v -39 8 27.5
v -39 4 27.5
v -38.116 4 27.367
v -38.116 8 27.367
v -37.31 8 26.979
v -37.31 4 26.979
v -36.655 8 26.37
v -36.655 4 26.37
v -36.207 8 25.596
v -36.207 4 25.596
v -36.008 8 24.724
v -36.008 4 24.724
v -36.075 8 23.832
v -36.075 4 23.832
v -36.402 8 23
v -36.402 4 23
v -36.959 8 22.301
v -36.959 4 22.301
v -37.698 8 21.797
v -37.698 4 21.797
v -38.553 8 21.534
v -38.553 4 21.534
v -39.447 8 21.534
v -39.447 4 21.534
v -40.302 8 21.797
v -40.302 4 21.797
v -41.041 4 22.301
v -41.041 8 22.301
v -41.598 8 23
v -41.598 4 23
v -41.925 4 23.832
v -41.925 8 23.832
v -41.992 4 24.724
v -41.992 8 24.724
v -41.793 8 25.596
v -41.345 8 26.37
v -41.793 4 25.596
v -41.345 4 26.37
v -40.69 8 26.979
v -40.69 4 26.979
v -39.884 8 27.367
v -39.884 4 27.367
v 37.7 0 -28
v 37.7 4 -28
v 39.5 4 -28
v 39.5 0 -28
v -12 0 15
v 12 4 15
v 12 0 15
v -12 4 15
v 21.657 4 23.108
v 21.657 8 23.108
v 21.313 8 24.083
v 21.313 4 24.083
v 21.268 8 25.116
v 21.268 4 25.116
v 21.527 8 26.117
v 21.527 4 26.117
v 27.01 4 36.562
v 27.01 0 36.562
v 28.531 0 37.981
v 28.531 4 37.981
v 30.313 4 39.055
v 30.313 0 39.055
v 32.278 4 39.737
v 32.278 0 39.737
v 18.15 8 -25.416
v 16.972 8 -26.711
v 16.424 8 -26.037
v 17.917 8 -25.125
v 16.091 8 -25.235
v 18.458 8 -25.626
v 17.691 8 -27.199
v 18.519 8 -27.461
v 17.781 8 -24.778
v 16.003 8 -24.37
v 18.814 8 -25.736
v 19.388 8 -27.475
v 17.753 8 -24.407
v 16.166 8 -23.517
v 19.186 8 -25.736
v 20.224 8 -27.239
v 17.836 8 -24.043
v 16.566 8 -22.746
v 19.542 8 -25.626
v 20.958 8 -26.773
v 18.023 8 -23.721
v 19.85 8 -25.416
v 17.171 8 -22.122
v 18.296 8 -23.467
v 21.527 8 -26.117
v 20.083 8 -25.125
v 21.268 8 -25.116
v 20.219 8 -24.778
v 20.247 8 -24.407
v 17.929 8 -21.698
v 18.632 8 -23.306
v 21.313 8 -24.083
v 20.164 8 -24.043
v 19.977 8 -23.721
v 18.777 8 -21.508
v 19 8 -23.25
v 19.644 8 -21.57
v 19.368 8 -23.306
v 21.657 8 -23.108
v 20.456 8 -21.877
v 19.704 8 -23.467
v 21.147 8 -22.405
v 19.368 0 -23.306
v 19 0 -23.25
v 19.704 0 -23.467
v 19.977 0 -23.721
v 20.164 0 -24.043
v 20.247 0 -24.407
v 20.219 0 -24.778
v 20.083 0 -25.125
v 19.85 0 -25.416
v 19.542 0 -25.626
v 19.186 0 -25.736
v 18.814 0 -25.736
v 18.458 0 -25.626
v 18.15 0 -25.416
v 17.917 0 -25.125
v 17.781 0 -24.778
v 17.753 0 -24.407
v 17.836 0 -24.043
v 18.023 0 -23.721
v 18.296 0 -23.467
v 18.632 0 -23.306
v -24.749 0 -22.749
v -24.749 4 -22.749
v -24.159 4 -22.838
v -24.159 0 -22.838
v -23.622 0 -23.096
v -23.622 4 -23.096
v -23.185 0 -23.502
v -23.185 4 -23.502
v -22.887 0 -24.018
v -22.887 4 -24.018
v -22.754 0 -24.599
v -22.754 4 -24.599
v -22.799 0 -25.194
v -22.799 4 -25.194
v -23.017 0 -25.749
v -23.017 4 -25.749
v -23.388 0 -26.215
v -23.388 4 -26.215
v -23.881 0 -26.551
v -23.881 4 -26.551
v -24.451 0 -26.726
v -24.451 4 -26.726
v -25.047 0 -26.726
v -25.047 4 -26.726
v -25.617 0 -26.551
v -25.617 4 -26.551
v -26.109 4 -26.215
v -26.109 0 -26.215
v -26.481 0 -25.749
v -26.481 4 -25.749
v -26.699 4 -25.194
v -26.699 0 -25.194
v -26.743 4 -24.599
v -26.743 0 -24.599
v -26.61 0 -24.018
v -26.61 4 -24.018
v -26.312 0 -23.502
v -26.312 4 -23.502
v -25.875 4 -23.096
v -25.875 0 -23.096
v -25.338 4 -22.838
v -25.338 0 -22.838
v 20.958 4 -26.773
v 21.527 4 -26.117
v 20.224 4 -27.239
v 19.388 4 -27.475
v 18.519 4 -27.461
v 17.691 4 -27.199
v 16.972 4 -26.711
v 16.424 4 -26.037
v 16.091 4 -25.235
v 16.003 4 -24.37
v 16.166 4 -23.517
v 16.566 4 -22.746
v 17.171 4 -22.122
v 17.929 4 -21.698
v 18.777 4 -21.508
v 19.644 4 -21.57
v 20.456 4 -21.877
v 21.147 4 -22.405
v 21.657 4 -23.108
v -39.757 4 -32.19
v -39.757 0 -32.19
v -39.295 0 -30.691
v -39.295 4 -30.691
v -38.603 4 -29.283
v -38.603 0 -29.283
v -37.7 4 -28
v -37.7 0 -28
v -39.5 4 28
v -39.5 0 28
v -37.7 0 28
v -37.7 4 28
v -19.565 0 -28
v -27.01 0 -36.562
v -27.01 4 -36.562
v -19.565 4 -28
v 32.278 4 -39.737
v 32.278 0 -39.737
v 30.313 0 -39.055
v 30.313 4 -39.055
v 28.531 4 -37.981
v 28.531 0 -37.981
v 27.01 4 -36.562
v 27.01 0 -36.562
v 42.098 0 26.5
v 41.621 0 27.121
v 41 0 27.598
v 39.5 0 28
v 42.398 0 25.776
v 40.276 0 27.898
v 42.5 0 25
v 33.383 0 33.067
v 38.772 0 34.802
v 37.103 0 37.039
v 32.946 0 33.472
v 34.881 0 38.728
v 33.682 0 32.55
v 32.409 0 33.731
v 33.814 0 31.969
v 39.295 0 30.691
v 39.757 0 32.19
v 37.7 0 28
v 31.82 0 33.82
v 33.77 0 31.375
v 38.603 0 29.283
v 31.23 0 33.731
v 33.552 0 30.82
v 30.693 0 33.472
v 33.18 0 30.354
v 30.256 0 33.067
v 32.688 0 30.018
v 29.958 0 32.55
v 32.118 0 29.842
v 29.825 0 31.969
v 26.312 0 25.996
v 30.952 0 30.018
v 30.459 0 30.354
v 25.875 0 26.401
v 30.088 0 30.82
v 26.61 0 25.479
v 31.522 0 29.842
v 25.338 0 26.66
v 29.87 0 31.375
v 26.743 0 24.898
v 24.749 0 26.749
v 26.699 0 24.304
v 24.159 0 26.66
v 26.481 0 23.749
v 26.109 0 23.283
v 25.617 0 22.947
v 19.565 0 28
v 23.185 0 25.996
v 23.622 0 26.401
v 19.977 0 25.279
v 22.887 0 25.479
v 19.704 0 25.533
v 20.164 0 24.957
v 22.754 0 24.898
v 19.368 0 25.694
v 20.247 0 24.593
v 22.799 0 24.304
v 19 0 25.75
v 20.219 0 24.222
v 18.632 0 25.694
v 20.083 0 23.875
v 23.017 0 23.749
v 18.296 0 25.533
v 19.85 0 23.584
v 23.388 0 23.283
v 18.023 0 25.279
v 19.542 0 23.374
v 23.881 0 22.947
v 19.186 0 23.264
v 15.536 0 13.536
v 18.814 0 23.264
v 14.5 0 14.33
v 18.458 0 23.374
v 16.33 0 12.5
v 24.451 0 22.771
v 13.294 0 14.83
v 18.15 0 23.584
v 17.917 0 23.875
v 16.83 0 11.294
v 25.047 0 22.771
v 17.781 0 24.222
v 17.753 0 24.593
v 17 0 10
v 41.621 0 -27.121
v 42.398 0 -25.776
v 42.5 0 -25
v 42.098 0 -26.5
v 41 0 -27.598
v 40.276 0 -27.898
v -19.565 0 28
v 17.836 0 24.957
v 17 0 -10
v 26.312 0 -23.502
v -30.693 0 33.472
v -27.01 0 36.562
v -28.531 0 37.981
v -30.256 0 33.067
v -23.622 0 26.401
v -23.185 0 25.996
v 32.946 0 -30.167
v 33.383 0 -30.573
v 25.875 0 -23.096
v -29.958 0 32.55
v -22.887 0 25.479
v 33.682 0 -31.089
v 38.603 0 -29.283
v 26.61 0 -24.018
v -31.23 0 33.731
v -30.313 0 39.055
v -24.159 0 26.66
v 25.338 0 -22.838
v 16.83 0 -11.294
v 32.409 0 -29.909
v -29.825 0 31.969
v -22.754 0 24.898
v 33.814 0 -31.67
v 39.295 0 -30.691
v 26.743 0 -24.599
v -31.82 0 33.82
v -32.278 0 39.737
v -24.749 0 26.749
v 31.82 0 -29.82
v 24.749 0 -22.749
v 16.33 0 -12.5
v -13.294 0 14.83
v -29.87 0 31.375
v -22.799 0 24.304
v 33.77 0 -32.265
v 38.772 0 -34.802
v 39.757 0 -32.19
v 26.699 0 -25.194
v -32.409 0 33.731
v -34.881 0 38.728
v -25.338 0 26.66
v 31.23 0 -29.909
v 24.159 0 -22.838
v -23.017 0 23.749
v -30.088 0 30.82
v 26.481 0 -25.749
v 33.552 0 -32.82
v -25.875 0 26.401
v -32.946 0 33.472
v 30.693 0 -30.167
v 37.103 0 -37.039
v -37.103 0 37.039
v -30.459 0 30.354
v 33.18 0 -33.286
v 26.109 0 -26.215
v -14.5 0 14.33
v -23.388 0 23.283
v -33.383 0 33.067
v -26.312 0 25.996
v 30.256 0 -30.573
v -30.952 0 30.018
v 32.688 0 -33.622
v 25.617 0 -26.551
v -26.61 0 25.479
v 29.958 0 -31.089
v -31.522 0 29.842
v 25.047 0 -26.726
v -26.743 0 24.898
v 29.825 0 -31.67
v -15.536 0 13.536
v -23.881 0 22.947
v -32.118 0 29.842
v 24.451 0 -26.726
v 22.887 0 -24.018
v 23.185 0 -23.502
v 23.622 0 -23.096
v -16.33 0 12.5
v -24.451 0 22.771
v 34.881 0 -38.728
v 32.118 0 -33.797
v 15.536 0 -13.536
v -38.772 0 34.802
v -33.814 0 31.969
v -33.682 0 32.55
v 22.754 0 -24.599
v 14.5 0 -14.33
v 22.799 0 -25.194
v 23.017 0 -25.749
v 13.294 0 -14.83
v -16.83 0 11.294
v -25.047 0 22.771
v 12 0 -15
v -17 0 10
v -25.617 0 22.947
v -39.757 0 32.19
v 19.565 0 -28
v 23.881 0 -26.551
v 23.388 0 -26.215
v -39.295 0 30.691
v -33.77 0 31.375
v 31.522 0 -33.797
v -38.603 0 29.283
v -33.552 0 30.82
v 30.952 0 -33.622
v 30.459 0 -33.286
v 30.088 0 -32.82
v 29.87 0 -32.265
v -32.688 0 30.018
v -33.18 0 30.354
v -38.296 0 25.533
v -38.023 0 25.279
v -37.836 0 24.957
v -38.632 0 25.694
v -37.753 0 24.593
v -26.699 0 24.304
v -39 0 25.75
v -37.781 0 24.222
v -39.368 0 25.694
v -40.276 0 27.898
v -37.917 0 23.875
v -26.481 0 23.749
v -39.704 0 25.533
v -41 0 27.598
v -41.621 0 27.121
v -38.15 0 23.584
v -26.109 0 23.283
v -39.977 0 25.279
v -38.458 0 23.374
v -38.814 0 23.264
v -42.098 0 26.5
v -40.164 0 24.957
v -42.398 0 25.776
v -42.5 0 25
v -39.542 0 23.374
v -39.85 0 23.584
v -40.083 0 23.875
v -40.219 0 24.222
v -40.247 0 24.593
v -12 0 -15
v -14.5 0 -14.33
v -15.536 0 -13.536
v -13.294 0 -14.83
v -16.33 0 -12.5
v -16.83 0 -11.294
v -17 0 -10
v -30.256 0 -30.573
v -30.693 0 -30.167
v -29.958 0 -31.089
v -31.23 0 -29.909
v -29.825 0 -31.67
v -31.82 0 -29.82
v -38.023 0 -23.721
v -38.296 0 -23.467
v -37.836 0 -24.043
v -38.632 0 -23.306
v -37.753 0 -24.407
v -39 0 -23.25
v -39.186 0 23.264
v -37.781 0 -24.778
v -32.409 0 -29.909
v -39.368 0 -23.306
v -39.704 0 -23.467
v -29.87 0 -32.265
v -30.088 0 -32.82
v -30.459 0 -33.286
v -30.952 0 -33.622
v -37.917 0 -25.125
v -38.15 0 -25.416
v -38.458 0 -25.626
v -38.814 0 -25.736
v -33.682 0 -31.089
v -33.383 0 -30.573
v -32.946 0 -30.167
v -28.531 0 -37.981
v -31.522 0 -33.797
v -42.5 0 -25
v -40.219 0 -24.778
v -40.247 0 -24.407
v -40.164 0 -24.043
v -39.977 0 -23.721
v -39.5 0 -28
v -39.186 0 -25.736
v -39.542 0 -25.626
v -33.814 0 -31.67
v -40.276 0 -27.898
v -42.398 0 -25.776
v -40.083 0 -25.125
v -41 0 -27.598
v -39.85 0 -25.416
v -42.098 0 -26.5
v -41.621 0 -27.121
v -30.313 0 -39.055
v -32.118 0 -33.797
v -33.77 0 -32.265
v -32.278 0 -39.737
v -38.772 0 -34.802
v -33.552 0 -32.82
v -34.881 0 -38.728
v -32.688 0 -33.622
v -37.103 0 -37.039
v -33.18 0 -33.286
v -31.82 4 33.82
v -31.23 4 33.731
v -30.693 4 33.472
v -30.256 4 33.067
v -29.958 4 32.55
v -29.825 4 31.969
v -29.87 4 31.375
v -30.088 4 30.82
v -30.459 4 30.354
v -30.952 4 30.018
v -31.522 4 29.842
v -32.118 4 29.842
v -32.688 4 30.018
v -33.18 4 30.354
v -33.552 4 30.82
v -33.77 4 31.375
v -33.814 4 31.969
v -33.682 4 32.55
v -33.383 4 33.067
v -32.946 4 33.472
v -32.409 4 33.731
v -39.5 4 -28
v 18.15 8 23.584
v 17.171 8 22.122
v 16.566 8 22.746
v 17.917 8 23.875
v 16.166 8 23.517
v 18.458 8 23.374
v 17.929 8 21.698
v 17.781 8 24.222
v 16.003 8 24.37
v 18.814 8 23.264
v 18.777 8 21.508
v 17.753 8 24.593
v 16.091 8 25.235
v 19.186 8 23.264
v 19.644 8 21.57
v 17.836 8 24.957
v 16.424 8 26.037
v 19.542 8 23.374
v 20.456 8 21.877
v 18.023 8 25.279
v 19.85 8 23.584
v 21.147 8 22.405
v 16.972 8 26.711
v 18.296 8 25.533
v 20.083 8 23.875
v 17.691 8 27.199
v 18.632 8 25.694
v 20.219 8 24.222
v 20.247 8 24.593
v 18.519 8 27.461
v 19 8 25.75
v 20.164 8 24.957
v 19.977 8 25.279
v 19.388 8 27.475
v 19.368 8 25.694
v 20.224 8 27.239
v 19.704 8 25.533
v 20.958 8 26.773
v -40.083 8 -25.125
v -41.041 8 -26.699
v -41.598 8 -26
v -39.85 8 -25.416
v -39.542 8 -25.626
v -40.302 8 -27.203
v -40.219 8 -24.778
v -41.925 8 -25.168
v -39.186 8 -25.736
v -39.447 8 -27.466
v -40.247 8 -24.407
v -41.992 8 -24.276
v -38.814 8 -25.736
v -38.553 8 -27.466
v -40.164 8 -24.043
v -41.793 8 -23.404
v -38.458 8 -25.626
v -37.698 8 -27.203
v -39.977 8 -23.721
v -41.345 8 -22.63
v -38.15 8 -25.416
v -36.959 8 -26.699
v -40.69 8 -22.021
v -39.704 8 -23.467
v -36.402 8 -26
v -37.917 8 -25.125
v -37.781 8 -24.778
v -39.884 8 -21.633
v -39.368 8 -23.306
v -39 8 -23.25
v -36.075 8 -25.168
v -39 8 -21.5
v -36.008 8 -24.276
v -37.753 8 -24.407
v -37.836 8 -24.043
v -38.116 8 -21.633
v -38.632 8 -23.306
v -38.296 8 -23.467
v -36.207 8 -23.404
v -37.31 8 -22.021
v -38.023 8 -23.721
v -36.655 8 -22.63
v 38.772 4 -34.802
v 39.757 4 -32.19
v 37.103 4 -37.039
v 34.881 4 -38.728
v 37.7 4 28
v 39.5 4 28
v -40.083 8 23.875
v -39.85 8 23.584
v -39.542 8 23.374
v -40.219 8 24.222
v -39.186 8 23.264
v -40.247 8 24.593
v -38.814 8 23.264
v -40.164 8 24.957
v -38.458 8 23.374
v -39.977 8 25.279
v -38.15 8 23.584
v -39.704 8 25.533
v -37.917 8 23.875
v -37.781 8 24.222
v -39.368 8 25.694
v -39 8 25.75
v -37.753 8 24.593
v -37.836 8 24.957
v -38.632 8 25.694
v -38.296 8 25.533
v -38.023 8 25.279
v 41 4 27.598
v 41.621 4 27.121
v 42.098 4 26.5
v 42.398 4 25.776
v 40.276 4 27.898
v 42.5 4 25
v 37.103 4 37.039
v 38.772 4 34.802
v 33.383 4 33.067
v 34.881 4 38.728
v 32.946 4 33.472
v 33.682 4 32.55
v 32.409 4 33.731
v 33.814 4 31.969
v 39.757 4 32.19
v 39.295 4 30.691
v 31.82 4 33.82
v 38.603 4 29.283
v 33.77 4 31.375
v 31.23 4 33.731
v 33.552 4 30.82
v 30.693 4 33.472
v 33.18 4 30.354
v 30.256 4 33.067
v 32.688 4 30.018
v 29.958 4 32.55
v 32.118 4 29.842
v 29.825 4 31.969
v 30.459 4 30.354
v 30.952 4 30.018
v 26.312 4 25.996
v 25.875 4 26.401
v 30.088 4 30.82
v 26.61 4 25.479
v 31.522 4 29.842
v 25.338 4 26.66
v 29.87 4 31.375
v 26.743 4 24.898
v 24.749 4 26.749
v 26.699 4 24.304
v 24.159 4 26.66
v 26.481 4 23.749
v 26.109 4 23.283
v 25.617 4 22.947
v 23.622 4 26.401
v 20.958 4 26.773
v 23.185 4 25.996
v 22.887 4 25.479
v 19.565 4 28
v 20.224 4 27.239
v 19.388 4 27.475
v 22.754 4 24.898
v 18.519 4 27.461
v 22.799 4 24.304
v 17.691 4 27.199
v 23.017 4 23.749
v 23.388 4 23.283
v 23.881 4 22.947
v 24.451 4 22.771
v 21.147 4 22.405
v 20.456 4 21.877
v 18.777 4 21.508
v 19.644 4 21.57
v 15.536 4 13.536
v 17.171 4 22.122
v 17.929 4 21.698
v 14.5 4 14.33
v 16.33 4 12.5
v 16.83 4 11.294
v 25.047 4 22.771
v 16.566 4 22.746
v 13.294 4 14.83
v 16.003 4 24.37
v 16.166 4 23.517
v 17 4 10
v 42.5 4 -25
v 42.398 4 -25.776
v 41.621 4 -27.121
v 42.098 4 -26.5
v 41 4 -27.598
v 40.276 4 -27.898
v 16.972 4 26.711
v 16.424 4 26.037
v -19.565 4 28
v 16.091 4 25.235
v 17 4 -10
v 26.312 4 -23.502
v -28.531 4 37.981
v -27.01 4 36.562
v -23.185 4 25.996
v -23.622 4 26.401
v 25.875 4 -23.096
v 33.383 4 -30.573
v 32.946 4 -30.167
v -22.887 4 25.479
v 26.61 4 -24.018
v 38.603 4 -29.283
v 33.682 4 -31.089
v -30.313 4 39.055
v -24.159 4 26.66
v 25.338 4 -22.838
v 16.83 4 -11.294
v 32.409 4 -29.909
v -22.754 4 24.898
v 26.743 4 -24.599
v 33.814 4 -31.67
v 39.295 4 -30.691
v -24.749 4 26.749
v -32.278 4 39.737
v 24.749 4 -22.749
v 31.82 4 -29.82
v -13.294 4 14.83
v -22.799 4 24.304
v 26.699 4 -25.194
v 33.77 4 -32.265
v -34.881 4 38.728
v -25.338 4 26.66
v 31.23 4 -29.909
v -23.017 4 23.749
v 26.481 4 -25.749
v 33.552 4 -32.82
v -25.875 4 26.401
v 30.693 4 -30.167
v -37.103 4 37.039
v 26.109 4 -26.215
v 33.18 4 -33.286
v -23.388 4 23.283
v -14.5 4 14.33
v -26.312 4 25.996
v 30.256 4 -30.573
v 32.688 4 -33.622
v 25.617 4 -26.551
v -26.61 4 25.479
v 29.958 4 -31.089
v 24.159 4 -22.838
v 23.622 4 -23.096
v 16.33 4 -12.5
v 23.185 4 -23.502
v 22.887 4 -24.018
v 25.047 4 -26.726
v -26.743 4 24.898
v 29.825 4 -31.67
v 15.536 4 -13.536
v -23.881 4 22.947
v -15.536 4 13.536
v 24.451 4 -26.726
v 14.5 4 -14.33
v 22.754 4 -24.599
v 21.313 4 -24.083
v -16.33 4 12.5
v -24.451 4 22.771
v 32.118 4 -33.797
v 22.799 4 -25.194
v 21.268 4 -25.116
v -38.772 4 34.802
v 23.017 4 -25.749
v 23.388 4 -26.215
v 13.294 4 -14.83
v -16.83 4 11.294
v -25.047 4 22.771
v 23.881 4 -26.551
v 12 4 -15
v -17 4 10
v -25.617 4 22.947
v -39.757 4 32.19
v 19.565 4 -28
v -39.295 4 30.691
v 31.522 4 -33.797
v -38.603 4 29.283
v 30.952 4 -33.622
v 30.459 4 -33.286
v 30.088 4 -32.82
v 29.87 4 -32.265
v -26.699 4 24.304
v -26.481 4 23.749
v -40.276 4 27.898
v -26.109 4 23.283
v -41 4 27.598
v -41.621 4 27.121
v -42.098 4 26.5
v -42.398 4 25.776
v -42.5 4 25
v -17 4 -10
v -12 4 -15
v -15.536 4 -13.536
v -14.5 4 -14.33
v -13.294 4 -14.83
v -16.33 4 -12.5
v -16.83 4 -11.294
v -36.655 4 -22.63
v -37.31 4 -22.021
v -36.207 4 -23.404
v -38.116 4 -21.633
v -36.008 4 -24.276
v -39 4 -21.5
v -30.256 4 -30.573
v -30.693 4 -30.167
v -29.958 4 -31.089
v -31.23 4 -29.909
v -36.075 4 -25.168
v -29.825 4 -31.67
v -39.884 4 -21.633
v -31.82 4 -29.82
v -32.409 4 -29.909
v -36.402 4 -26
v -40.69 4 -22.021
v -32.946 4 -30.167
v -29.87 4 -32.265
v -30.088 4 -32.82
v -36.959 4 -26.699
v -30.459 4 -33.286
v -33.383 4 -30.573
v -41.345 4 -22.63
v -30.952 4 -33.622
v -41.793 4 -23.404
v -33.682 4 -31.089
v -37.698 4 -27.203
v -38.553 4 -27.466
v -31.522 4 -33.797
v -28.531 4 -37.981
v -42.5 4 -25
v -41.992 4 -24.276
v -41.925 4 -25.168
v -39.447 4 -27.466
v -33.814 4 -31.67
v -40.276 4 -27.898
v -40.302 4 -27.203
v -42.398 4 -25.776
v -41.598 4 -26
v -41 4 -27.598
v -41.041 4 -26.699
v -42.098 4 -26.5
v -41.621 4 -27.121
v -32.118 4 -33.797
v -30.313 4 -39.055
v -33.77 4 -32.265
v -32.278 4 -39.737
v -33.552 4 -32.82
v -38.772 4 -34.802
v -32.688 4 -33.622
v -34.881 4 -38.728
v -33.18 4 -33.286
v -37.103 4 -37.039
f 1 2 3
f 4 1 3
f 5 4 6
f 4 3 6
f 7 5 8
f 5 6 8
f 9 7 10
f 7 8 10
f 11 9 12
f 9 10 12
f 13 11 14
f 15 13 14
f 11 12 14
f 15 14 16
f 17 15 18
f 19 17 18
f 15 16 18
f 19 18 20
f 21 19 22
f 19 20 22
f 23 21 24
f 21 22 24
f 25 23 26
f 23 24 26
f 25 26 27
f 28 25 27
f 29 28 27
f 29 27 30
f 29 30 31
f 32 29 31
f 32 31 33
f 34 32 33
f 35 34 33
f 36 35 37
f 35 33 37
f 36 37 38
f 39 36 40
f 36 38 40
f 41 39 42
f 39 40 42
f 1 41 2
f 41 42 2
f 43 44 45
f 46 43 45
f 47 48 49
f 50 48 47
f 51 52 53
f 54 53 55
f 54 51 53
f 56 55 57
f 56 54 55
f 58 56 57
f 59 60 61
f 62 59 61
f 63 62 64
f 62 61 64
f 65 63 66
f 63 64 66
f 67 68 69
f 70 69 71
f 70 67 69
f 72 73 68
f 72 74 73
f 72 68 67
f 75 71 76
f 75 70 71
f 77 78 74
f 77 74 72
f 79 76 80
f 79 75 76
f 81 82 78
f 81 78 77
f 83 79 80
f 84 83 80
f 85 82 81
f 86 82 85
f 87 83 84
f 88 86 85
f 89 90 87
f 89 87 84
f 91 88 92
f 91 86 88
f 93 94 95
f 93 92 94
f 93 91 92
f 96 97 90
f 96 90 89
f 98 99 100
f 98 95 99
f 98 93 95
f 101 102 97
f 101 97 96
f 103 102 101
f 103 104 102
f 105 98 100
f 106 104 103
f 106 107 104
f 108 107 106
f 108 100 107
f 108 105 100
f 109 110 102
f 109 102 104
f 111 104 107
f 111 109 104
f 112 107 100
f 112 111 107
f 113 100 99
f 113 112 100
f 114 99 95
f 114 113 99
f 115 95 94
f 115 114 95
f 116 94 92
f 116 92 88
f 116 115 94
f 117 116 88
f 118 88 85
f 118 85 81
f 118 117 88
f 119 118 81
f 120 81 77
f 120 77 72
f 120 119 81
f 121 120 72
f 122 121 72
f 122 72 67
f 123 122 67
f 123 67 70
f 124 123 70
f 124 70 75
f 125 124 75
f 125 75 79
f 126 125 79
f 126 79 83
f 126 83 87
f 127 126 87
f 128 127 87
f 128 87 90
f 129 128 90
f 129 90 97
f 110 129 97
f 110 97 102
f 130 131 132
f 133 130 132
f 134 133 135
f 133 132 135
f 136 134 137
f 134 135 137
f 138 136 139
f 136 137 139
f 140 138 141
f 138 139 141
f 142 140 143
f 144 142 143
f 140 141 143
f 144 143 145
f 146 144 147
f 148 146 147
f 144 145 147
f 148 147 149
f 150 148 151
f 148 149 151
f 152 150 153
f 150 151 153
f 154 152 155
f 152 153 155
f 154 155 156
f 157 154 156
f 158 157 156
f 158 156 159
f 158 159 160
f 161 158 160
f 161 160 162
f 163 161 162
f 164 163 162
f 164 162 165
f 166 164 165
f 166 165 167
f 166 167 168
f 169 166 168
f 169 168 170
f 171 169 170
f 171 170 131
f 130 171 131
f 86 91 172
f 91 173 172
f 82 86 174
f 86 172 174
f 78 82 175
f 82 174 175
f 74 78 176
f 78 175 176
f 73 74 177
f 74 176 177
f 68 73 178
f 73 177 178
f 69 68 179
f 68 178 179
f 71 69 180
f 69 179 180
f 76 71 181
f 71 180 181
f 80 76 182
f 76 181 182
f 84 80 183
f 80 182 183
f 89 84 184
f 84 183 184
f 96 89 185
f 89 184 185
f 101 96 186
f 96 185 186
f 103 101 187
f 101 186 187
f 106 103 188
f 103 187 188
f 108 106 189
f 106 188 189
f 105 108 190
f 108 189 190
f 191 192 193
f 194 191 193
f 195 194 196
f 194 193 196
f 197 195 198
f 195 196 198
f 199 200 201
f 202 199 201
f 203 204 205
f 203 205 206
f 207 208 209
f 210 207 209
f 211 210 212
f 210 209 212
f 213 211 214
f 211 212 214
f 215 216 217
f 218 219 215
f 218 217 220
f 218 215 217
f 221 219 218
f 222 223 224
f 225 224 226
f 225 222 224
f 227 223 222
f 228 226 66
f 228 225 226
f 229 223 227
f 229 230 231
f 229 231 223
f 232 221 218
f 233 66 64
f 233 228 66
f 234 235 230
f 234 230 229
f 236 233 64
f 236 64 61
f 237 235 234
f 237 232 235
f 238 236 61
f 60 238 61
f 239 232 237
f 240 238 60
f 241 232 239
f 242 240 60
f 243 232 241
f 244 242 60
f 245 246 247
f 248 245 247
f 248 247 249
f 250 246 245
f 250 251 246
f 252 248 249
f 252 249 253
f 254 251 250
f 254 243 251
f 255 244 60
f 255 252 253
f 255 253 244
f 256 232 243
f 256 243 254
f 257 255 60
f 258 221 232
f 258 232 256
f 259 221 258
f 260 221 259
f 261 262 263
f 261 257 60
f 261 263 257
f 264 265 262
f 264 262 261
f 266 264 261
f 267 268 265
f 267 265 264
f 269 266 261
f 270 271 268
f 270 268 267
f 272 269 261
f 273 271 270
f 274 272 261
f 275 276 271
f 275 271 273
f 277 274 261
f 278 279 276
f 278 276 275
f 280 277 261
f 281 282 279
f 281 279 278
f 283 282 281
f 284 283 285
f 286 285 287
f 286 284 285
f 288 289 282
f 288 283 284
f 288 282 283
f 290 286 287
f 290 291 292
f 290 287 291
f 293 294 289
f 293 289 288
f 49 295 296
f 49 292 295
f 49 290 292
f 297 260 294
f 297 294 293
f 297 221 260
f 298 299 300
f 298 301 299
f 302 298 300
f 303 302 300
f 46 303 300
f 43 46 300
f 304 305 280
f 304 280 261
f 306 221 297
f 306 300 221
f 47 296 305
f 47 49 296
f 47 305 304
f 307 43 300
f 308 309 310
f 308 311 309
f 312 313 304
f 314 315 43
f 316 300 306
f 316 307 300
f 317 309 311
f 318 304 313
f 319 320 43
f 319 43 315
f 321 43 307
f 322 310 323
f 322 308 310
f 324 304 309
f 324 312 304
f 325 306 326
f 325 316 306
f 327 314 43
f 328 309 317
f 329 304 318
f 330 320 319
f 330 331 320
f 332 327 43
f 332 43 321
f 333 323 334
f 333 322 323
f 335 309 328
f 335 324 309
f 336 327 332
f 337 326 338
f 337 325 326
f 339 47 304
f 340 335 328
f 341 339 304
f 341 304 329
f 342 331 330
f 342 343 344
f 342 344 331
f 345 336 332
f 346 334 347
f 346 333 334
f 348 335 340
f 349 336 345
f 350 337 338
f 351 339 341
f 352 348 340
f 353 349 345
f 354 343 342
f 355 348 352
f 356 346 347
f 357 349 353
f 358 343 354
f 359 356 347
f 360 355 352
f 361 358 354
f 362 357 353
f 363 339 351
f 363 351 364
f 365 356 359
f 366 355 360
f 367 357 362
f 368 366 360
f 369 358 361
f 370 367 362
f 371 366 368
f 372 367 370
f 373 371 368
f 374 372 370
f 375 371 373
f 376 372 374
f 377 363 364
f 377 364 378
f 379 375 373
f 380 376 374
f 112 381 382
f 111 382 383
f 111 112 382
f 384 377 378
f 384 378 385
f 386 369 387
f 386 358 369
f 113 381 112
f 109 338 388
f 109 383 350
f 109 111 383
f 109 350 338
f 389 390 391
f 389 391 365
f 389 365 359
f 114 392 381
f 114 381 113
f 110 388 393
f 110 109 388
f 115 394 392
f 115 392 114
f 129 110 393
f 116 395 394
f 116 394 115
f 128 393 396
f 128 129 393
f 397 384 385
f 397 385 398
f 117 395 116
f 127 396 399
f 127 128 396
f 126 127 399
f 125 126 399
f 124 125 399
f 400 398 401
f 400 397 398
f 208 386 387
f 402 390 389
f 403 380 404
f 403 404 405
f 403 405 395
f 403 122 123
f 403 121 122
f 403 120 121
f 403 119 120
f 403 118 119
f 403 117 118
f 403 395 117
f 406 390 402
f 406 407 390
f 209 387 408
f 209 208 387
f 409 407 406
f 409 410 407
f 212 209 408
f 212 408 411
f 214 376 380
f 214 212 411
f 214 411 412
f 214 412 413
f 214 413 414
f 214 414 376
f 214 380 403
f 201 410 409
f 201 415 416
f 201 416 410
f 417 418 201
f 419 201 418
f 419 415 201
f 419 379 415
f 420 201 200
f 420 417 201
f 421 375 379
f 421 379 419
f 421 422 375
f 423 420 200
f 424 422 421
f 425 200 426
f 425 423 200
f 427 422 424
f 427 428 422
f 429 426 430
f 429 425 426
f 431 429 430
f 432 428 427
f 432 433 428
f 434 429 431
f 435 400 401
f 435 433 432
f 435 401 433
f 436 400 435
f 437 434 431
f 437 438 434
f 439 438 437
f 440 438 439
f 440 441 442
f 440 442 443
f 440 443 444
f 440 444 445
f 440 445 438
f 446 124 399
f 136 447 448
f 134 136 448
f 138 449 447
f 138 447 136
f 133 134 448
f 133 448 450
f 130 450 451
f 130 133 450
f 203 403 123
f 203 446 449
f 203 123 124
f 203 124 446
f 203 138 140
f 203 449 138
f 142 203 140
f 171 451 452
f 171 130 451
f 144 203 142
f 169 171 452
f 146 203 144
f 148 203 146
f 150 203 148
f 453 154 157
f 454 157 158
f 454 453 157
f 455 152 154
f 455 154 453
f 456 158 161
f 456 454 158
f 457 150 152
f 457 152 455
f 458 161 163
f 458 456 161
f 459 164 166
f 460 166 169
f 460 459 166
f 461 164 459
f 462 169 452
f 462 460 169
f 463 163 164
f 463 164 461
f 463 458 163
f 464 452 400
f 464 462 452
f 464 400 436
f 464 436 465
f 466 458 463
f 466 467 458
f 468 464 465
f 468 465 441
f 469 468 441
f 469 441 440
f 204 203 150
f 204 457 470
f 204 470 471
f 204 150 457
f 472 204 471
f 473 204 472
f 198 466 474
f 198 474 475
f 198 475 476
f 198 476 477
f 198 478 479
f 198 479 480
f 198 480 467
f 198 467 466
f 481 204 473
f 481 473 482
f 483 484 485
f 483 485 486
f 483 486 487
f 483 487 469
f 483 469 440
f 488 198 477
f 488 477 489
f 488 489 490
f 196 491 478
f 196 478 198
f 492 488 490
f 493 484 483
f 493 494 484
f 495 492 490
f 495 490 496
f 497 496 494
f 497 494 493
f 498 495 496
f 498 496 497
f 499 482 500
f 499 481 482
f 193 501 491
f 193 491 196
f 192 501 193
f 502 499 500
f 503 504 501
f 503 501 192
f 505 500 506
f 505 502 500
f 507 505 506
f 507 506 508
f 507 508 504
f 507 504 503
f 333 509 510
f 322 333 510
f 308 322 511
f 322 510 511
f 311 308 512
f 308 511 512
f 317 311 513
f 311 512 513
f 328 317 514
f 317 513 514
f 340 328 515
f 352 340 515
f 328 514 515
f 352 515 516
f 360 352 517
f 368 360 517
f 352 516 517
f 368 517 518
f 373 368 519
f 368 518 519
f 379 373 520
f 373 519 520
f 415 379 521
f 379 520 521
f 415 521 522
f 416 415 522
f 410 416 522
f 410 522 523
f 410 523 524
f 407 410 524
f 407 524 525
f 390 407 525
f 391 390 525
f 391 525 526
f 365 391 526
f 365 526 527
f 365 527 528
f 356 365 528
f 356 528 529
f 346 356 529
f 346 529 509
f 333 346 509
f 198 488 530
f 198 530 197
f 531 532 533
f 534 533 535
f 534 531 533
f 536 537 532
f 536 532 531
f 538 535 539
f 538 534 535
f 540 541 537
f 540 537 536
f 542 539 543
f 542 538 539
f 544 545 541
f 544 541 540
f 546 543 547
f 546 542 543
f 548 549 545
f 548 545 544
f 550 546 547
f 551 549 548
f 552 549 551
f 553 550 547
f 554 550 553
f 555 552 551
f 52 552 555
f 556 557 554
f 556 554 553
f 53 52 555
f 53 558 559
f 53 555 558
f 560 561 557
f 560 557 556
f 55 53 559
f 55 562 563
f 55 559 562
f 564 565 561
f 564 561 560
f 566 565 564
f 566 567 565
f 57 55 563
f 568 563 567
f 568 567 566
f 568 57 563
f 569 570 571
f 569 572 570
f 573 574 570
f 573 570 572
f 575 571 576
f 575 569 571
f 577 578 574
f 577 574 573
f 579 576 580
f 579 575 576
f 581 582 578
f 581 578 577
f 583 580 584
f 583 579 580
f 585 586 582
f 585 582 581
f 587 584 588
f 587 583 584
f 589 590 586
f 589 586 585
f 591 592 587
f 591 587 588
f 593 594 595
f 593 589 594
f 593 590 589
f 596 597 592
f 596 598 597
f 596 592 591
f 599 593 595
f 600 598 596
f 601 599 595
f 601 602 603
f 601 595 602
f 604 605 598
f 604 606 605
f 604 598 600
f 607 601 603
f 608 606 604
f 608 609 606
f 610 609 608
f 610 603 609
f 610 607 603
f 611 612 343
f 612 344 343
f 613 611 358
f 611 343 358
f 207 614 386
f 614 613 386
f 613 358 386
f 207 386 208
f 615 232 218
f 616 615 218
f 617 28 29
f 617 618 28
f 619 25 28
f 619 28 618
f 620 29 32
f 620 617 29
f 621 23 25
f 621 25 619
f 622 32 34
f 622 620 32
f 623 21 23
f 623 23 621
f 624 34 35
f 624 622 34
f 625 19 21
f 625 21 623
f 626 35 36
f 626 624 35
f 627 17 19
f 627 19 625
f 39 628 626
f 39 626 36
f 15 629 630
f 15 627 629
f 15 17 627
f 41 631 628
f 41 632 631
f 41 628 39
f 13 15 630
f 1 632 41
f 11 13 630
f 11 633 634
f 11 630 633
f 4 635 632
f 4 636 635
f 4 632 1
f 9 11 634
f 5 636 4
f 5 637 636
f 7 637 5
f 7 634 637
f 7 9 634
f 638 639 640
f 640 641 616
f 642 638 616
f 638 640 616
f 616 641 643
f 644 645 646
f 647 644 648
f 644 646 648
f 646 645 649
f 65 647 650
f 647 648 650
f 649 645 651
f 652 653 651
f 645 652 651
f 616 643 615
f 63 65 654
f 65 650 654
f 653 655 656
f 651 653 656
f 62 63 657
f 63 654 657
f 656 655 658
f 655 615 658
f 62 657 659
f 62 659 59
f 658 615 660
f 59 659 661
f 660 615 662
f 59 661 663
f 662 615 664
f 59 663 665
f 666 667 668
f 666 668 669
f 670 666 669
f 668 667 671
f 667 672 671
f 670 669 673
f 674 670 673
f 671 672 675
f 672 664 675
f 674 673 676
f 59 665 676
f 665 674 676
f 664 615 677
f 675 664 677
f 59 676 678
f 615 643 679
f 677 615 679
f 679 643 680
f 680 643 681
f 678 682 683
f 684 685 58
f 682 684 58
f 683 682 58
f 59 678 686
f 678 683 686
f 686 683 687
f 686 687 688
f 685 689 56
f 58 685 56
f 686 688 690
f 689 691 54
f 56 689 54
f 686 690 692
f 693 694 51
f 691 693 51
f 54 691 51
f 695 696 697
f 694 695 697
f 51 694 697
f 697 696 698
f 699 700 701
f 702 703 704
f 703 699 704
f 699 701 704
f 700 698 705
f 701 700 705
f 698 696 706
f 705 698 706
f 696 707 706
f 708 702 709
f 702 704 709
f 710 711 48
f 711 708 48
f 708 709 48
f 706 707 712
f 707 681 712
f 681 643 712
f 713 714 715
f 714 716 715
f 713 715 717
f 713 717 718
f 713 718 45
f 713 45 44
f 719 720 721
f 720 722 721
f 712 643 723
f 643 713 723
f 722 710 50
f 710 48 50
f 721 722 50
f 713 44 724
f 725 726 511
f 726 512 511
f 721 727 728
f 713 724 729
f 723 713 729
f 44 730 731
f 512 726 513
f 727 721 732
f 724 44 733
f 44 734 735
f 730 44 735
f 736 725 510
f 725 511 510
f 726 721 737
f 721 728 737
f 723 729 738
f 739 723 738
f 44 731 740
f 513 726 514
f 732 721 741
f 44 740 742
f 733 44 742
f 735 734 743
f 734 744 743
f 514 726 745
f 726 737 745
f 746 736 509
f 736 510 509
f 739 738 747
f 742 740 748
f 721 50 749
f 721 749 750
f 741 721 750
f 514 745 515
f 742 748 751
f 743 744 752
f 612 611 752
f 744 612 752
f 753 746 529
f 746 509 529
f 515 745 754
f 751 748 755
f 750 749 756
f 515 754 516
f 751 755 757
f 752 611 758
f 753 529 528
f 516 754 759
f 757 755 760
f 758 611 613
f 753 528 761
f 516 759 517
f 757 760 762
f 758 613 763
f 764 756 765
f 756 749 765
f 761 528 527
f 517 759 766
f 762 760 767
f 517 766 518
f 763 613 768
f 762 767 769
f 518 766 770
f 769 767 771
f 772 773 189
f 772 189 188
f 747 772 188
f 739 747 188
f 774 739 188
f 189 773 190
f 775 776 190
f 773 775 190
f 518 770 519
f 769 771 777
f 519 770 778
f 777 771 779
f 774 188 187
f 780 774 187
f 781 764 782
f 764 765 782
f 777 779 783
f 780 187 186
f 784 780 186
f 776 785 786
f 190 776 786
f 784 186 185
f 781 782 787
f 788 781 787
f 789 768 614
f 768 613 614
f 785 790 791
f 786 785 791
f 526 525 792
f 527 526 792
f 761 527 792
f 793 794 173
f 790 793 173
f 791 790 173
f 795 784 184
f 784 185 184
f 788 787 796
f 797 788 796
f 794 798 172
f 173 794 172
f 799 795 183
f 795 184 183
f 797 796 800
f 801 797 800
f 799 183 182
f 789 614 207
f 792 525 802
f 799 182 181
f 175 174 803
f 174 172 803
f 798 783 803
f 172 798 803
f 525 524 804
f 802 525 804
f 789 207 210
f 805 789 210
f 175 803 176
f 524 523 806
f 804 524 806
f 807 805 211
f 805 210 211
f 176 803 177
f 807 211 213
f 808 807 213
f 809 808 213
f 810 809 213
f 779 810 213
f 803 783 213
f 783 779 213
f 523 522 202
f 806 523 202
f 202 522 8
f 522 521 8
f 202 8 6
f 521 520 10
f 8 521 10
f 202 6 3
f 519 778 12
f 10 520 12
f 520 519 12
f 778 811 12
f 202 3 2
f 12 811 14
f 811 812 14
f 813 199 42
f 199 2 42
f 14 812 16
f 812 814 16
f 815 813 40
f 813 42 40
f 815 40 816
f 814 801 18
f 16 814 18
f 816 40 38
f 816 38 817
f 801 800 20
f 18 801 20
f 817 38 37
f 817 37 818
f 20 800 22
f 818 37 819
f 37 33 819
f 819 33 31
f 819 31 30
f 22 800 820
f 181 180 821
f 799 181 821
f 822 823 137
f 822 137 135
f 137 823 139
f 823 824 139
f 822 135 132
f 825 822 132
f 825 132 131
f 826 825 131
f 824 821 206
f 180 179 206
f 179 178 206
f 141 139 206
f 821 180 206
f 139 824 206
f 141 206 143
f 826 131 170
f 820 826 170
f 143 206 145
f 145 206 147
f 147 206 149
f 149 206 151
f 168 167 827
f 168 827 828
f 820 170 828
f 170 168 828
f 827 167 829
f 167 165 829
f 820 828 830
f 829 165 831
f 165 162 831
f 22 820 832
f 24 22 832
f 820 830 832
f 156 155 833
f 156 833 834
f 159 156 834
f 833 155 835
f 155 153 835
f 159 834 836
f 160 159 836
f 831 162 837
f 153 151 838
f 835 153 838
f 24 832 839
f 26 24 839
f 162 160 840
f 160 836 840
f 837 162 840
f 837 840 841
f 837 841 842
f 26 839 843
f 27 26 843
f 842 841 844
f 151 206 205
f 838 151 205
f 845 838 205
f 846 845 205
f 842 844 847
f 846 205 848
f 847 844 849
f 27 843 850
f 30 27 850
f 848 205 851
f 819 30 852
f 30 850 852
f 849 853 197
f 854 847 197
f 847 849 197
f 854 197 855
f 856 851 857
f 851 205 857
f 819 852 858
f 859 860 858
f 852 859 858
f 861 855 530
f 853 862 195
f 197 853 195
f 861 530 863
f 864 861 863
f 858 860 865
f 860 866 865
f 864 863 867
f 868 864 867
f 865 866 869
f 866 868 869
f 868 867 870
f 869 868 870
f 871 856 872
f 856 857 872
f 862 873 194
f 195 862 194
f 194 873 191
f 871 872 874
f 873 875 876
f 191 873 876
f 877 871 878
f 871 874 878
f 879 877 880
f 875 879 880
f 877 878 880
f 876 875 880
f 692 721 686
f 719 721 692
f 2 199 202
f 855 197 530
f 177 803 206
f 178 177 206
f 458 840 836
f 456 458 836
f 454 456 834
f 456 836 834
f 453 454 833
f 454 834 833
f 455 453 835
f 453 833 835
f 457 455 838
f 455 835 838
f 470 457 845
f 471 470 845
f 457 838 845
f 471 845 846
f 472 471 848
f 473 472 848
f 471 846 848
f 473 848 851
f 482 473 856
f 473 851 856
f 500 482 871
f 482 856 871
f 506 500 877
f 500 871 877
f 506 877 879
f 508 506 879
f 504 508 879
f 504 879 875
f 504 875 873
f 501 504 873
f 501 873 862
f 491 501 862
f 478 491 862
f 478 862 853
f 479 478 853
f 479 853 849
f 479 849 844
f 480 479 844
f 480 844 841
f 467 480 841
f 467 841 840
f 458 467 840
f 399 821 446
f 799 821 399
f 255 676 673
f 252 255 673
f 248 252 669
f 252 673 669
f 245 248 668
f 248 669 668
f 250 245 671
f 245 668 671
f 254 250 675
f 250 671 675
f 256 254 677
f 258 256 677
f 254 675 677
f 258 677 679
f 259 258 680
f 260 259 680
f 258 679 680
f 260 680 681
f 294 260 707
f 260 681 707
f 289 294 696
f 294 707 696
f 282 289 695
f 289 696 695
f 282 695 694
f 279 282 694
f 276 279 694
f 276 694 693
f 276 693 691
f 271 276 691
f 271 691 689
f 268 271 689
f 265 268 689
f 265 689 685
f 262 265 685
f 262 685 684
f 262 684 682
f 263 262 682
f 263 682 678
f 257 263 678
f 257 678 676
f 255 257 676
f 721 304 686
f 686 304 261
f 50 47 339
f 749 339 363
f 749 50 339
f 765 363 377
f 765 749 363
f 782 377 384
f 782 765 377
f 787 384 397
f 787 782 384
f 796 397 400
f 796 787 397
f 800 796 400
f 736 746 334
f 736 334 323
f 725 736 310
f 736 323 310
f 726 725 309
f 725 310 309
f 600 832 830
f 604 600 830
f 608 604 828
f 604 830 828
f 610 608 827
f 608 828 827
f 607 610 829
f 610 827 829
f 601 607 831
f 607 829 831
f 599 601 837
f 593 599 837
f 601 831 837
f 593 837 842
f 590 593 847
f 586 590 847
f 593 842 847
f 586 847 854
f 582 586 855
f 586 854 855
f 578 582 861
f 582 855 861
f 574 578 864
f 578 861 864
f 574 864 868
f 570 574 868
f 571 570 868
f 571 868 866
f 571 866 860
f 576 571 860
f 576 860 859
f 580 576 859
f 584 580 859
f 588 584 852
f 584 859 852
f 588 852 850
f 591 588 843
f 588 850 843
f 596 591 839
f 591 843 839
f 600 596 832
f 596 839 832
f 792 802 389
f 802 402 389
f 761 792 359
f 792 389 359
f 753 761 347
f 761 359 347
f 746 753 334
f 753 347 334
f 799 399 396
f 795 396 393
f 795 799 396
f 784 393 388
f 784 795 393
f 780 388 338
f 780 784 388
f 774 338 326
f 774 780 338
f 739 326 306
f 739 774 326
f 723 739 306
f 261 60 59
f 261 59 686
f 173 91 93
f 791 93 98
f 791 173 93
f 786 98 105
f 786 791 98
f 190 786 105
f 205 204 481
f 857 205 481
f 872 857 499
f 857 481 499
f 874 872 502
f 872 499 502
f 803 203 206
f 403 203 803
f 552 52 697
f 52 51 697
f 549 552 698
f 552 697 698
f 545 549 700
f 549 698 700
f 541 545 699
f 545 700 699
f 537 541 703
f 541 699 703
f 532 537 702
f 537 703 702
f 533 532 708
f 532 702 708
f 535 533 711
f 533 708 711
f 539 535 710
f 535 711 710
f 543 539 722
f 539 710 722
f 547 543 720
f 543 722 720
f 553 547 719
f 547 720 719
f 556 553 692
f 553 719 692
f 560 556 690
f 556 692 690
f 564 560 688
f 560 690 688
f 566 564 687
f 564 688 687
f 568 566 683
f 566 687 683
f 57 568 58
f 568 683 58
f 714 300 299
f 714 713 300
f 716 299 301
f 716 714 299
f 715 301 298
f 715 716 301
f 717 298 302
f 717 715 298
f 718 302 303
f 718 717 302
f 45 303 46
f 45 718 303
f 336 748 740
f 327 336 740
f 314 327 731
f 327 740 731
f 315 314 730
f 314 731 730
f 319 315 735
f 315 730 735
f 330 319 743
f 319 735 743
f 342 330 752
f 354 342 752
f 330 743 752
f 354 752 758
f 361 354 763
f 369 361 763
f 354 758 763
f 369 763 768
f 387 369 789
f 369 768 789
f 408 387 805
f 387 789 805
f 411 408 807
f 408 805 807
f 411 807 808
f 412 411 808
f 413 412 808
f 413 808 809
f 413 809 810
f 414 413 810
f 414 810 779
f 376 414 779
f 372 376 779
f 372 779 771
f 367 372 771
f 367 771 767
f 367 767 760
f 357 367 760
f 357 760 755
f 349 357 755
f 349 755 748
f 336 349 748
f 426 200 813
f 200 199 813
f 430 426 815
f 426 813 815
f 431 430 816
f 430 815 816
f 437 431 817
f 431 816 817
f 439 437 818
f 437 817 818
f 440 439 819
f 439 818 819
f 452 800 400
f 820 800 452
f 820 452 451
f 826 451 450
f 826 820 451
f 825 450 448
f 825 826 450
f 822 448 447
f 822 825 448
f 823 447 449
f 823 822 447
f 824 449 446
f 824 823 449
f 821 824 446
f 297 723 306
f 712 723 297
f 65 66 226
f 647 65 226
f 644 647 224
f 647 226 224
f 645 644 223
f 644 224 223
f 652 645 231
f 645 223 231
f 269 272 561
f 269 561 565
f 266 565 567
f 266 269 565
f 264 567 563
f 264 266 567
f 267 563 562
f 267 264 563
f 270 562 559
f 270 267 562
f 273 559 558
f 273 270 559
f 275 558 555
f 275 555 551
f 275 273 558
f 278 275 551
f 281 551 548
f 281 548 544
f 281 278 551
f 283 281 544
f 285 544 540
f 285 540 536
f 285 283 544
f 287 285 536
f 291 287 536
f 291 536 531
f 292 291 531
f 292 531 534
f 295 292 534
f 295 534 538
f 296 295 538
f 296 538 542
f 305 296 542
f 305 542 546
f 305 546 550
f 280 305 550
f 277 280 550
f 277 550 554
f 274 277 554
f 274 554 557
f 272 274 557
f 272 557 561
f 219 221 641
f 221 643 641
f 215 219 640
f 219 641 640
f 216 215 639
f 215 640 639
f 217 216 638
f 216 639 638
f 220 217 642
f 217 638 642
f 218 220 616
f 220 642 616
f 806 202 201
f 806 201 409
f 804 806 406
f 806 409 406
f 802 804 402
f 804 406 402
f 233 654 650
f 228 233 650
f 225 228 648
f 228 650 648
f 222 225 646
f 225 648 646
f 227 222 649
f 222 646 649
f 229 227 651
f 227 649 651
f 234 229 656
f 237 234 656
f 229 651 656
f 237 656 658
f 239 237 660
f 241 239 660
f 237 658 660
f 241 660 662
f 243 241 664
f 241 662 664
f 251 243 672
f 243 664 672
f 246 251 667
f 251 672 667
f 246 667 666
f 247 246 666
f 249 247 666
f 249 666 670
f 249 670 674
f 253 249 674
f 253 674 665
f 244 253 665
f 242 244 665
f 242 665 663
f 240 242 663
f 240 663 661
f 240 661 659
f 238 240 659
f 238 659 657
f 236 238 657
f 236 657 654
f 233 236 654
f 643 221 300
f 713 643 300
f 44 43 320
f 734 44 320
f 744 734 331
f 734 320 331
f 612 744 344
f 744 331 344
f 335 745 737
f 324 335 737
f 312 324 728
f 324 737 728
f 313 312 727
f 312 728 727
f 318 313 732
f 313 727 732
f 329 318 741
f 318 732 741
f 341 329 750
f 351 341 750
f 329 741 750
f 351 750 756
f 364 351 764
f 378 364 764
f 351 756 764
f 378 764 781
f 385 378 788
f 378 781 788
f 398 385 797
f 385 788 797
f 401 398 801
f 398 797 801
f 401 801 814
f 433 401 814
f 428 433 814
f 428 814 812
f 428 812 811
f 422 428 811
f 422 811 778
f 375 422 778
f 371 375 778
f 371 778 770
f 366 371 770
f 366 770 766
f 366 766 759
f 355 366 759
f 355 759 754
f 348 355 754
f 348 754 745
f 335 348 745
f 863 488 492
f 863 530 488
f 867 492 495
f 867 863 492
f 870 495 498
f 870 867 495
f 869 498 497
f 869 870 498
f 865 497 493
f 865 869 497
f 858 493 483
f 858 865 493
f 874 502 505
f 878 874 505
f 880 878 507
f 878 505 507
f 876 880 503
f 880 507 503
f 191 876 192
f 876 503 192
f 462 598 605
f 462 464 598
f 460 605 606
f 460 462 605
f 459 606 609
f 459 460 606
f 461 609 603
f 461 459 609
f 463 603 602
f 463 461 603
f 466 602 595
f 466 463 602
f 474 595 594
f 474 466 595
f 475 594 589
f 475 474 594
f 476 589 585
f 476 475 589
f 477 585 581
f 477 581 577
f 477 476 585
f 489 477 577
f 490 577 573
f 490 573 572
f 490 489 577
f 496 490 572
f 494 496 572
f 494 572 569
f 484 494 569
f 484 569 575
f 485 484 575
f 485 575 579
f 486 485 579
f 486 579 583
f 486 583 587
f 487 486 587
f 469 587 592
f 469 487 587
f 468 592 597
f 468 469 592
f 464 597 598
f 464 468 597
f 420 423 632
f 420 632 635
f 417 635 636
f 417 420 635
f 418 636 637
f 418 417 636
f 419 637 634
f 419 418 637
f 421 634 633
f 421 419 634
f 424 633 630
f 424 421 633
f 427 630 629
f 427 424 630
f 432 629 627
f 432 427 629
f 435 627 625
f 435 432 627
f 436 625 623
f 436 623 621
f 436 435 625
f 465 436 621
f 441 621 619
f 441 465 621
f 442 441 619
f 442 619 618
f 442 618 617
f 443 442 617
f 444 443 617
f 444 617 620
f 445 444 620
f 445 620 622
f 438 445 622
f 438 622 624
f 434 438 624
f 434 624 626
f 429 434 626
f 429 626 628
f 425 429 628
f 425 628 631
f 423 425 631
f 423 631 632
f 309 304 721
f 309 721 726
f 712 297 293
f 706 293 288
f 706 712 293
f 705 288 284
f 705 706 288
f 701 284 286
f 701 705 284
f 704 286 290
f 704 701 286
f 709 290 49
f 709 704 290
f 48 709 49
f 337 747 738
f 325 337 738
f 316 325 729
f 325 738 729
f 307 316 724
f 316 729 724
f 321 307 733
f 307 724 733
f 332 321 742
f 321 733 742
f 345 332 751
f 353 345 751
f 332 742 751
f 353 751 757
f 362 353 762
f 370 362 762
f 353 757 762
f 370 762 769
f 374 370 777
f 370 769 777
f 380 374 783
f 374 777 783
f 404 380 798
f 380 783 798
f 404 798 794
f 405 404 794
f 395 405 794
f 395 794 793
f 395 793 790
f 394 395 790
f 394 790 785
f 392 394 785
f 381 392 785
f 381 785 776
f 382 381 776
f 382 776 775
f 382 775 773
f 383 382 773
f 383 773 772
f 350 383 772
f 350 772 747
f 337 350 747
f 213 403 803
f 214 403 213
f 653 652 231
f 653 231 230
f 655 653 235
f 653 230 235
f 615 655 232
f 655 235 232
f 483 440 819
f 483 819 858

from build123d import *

# Parameters (mm, degrees)
SKETCH1_W           = 85
SKETCH1_H           = 56
SKETCH1_R           = 1.25
BOSS_EXTRUDE1_DEPTH = 4
SKETCH2_R           = 3
SKETCH2_R_2         = 1.25
BOSS_EXTRUDE2_DEPTH = 4
FILLET1_R           = 3
BOSS_EXTRUDE4_DEPTH = 4
SKETCH3_R           = 2
CUT_EXTRUDE1_DEPTH  = 59.5
FILLET2_R           = 10
CUT_EXTRUDE2_START  = -10
SKETCH6_R           = 1.25
CUT_EXTRUDE2_DEPTH  = 10
SKETCH7_R           = 3.5
CUT_EXTRUDE3_DEPTH  = 10


with BuildPart() as part:
    # Sketch1 → Boss-Extrude1 (new body)
    with BuildSketch(Plane(origin=(0, 0, 0), x_dir=(1, 0, 0), z_dir=(0, 1, 0))):
        Rectangle(SKETCH1_W, SKETCH1_H)
        with Locations(Location((-39, 24.5, 0), (0, 0, 270))):
            Circle(SKETCH1_R, mode=Mode.SUBTRACT)
        with Locations(Location((-39, -24.5, 0), (0, 0, 270))):
            Circle(SKETCH1_R, mode=Mode.SUBTRACT)
        with Locations(Location((19, 24.5, 0), (0, 0, 270))):
            Circle(SKETCH1_R, mode=Mode.SUBTRACT)
        with Locations(Location((19, -24.5, 0), (0, 0, 270))):
            Circle(SKETCH1_R, mode=Mode.SUBTRACT)
        with BuildLine():
            Line((-12, -15), (12, -15))
            ThreePointArc((12, -15), (15.535533906, -13.535533906), (17, -10))
            Line((17, -10), (17, 10))
            ThreePointArc((17, 10), (15.535533906, 13.535533906), (12, 15))
            Line((12, 15), (-12, 15))
            ThreePointArc((-12, 15), (-15.535533906, 13.535533906), (-17, 10))
            Line((-17, 10), (-17, -10))
            ThreePointArc((-17, -10), (-15.535533906, -13.535533906), (-12, -15))
        make_face(mode=Mode.SUBTRACT)
    extrude(amount=BOSS_EXTRUDE1_DEPTH)

    # Sketch2 → Boss-Extrude2 (add)
    # profile 1 of 4: a face of its own
    with BuildSketch(Plane(origin=(0, 4, 0), x_dir=(1, 0, 0), z_dir=(0, 1, 0))):
        with Locations(Location((-39, 24.5, 0), (0, 0, 270))):
            Circle(SKETCH2_R)
        with Locations(Location((-39, 24.5, 0), (0, 0, 270))):
            Circle(SKETCH2_R_2, mode=Mode.SUBTRACT)
    # profile 2 of 4: a face of its own
    with BuildSketch(Plane(origin=(0, 4, 0), x_dir=(1, 0, 0), z_dir=(0, 1, 0))):
        with Locations(Location((19, 24.5, 0), (0, 0, 270))):
            Circle(SKETCH2_R)
        with Locations(Location((19, 24.5, 0), (0, 0, 270))):
            Circle(SKETCH2_R_2, mode=Mode.SUBTRACT)
    # profile 3 of 4: a face of its own
    with BuildSketch(Plane(origin=(0, 4, 0), x_dir=(1, 0, 0), z_dir=(0, 1, 0))):
        with Locations(Location((19, -24.5, 0), (0, 0, 270))):
            Circle(SKETCH2_R)
        with Locations(Location((19, -24.5, 0), (0, 0, 270))):
            Circle(SKETCH2_R_2, mode=Mode.SUBTRACT)
    # profile 4 of 4: a face of its own
    with BuildSketch(Plane(origin=(0, 4, 0), x_dir=(1, 0, 0), z_dir=(0, 1, 0))):
        with Locations(Location((-39, -24.5, 0), (0, 0, 270))):
            Circle(SKETCH2_R)
        with Locations(Location((-39, -24.5, 0), (0, 0, 270))):
            Circle(SKETCH2_R_2, mode=Mode.SUBTRACT)
    extrude(amount=BOSS_EXTRUDE2_DEPTH)

    # Fillet1
    fillet1_edges = [part.edges().sort_by_distance(p)[0] for p in [
        (-42.5, 2, 28),
        (-42.5, 2, -28),
        (42.5, 2, -28),
        (42.5, 2, 28),
    ]]
    fillet(fillet1_edges, radius=FILLET1_R)

    # Sketch5 → Boss-Extrude4 (add)
    with BuildSketch(Plane(origin=(0, 0, 0), x_dir=(1, 0, 0), z_dir=(0, 1, 0))):
        Polygon((-40, -30), (-17, -10), (-17, 10), (-40, 30), (-40, 40), (-30, 40), (-10, 17), (10, 17), (30, 40), (40, 40), (40, 30), (17, 10), (17, -10), (40, -30), (40, -40), (30, -40), (10, -17), (-10, -17), (-30, -40), (-40, -40), align=None)
    extrude(amount=BOSS_EXTRUDE4_DEPTH)

    # Sketch3 → Cut-Extrude1 (cut, through all)
    with BuildSketch(Plane(origin=(0, 4, 0), x_dir=(1, 0, 0), z_dir=(0, 1, 0))):
        with Locations(Location((-31.819805153, 31.819805153, 0), (0, 0, 270))):
            Circle(SKETCH3_R)
        with Locations(Location((-24.748737342, 24.748737342, 0), (0, 0, 270))):
            Circle(SKETCH3_R)
        with Locations(Location((31.819805153, 31.819805153, 0), (0, 0, 270))):
            Circle(SKETCH3_R)
        with Locations(Location((24.748737342, 24.748737342, 0), (0, 0, 270))):
            Circle(SKETCH3_R)
        with Locations(Location((24.748737342, -24.748737342, 0), (0, 0, 270))):
            Circle(SKETCH3_R)
        with Locations(Location((31.819805153, -31.819805153, 0), (0, 0, 270))):
            Circle(SKETCH3_R)
        with Locations(Location((-31.819805153, -31.819805153, 0), (0, 0, 270))):
            Circle(SKETCH3_R)
        with Locations(Location((-24.748737342, -24.748737342, 0), (0, 0, 270))):
            Circle(SKETCH3_R)
        with BuildLine():
            Line((12, -15), (-12, -15))
            ThreePointArc((-12, -15), (-15.535533906, -13.535533906), (-17, -10))
            Line((-17, -10), (-17, 10))
            ThreePointArc((-17, 10), (-15.535533906, 13.535533906), (-12, 15))
            Line((-12, 15), (12, 15))
            ThreePointArc((12, 15), (15.535533906, 13.535533906), (17, 10))
            Line((17, 10), (17, -10))
            ThreePointArc((17, -10), (15.535533906, -13.535533906), (12, -15))
        make_face()
    extrude(amount=-CUT_EXTRUDE1_DEPTH, mode=Mode.SUBTRACT)

    # Fillet2
    # the kernel refuses this fillet: 10 mm, written as the material it takes off along each edge
    with BuildSketch(Plane(origin=(-40, -10.951097141, -30), x_dir=(0.7546055221635131, 0, 0.6561787149247771), z_dir=(0, 1, 0))) as fillet2_piece_1_section:
        with BuildLine():
            CenterArc((4.671704482, 9.8672905), FILLET2_R, 221.009086902, 39.646111147)
            Line((-2.87435074, 3.305503351), (-3.025271844, 3.174267608))
            Line((-3.025271844, 3.174267608), (-0.150921104, -0.131235743))
            Line((-0.150921104, -0.131235743), (0, -0.2))
            ThreePointArc((0, -0.2), (1.523975065, -0.2), (3.015475044, -0.19734581))
            Line((3.015475044, -0.19734581), (3.047950131, 0))
        make_face()
    fillet2_piece_1 = extrude(amount=25.902194282, mode=Mode.PRIVATE)
    fillet2_piece_1 = split(fillet2_piece_1, bisect_by=Plane(origin=(-39.506364614, 2, -28), z_dir=(0, 0, -1)), keep=Keep.TOP, mode=Mode.PRIVATE)
    add(fillet2_piece_1, mode=Mode.SUBTRACT)
    with BuildSketch(Plane(origin=(-40, -25, -40), x_dir=(0, 0, 1), z_dir=(0, 1, 0)), Plane(origin=(40, -25, -40), x_dir=(-1, 0, 0), z_dir=(0, 1, 0))) as fillet2_piece_2:
        with BuildLine():
            CenterArc((FILLET2_R, FILLET2_R), FILLET2_R, 180, 90)
            Line((0, FILLET2_R), (-FILLET2_R * 0.02, FILLET2_R))
            Line((-FILLET2_R * 0.02, FILLET2_R), (-FILLET2_R * 0.02, -FILLET2_R * 0.02))
            Line((-FILLET2_R * 0.02, -FILLET2_R * 0.02), (FILLET2_R, -FILLET2_R * 0.02))
            Line((FILLET2_R, -FILLET2_R * 0.02), (FILLET2_R, 0))
        make_face()
    extrude(amount=54, mode=Mode.SUBTRACT)
    with BuildSketch(Plane(origin=(-30, -11.390762292, -40), x_dir=(-1, 0, 0), z_dir=(0, 1, 0)), Plane(origin=(30, -11.390762292, -40), x_dir=(-0.6561787149247741, 0, 0.7546055221635154), z_dir=(0, 1, 0))) as fillet2_piece_3:
        with BuildLine():
            CenterArc((FILLET2_R * 0.455630491663, FILLET2_R), FILLET2_R, 221.009086902, 48.990913098)
            Line((-FILLET2_R * 0.2989750305, FILLET2_R * 0.343821285075), (-FILLET2_R * 0.314067140943, FILLET2_R * 0.330697710777))
            Line((-FILLET2_R * 0.314067140943, FILLET2_R * 0.330697710777), (-FILLET2_R * 0.00911260983327, -FILLET2_R * 0.02))
            Line((-FILLET2_R * 0.00911260983327, -FILLET2_R * 0.02), (FILLET2_R * 0.455630491663, -FILLET2_R * 0.02))
            Line((FILLET2_R * 0.455630491663, -FILLET2_R * 0.02), (FILLET2_R * 0.455630491663, 0))
        make_face()
    extrude(amount=26.781524583, mode=Mode.SUBTRACT)
    with BuildSketch(Plane(origin=(40, -10.951097141, -30), x_dir=(0, 0, -1), z_dir=(0, 1, 0))) as fillet2_piece_4_section:
        with BuildLine():
            CenterArc((4.380438856, 10), FILLET2_R, 230.353888853, 39.646111147)
            Line((-2, 2.3), (-2.127608777, 2.146))
            ThreePointArc((-2.127608777, 2.146), (-1.150921104, 1.018764257), (-0.150921104, -0.131235743))
            Line((-0.150921104, -0.131235743), (0, -0.2))
            Line((0, -0.2), (4.380438856, -0.2))
            Line((4.380438856, -0.2), (4.380438856, 0))
        make_face()
    fillet2_piece_4 = extrude(amount=25.902194282, mode=Mode.PRIVATE)
    fillet2_piece_4 = split(fillet2_piece_4, bisect_by=Plane(origin=(39.506364614, 2, -28), z_dir=(0, 0, -1)), keep=Keep.TOP, mode=Mode.PRIVATE)
    add(fillet2_piece_4, mode=Mode.SUBTRACT)
    with BuildSketch(Plane(origin=(40, -10.951097141, 30), x_dir=(0, 0, 1), z_dir=(0, 1, 0))) as fillet2_piece_5_section:
        with BuildLine():
            CenterArc((4.380438856, -10), FILLET2_R, 90, 39.646111147)
            Line((-2, -2.3), (-2.127608777, -2.146))
            ThreePointArc((-2.127608777, -2.146), (-1.150921104, -1.018764257), (-0.150921104, 0.131235743))
            Line((-0.150921104, 0.131235743), (0, 0.2))
            Line((0, 0.2), (4.380438856, 0.2))
            Line((4.380438856, 0.2), (4.380438856, 0))
        make_face()
    fillet2_piece_5 = extrude(amount=25.902194282, mode=Mode.PRIVATE)
    fillet2_piece_5 = split(fillet2_piece_5, bisect_by=Plane(origin=(39.506364614, 2, 28), z_dir=(0, 0, 1)), keep=Keep.TOP, mode=Mode.PRIVATE)
    add(fillet2_piece_5, mode=Mode.SUBTRACT)
    with BuildSketch(Plane(origin=(40, -25, 40), x_dir=(-1, 0, 0), z_dir=(0, 1, 0)), Plane(origin=(-40, -25, 40), x_dir=(0, 0, -1), z_dir=(0, 1, 0))) as fillet2_piece_6:
        with BuildLine():
            CenterArc((FILLET2_R, -FILLET2_R), FILLET2_R, 90, 90)
            Line((0, -FILLET2_R), (-FILLET2_R * 0.02, -FILLET2_R))
            Line((-FILLET2_R * 0.02, -FILLET2_R), (-FILLET2_R * 0.02, FILLET2_R * 0.02))
            Line((-FILLET2_R * 0.02, FILLET2_R * 0.02), (FILLET2_R, FILLET2_R * 0.02))
            Line((FILLET2_R, FILLET2_R * 0.02), (FILLET2_R, 0))
        make_face()
    extrude(amount=54, mode=Mode.SUBTRACT)
    with BuildSketch(Plane(origin=(30, -11.390762292, 40), x_dir=(-0.6561787149247873, 0, -0.7546055221635042), z_dir=(0, 1, 0)), Plane(origin=(-30, -11.390762292, 40), x_dir=(-1, 0, 0), z_dir=(0, 1, 0))) as fillet2_piece_7:
        with BuildLine():
            CenterArc((FILLET2_R * 0.455630491663, -FILLET2_R), FILLET2_R, 90, 48.990913098)
            Line((-FILLET2_R * 0.2989750305, -FILLET2_R * 0.343821285075), (-FILLET2_R * 0.314067140943, -FILLET2_R * 0.330697710777))
            Line((-FILLET2_R * 0.314067140943, -FILLET2_R * 0.330697710777), (-FILLET2_R * 0.00911260983327, FILLET2_R * 0.02))
            Line((-FILLET2_R * 0.00911260983327, FILLET2_R * 0.02), (FILLET2_R * 0.455630491663, FILLET2_R * 0.02))
            Line((FILLET2_R * 0.455630491663, FILLET2_R * 0.02), (FILLET2_R * 0.455630491663, 0))
        make_face()
    extrude(amount=26.781524583, mode=Mode.SUBTRACT)
    with BuildSketch(Plane(origin=(-40, -10.951097141, 30), x_dir=(0.7546055221635047, 0, -0.6561787149247865), z_dir=(0, 1, 0))) as fillet2_piece_8_section:
        with BuildLine():
            CenterArc((4.671704482, -9.8672905), FILLET2_R, 99.344801951, 39.646111147)
            Line((-2.87435074, -3.305503351), (-3.025271844, -3.174267608))
            Line((-3.025271844, -3.174267608), (-0.150921104, 0.131235743))
            Line((-0.150921104, 0.131235743), (0, 0.2))
            ThreePointArc((0, 0.2), (1.523975065, 0.2), (3.015475044, 0.19734581))
            Line((3.015475044, 0.19734581), (3.047950131, 0))
        make_face()
    fillet2_piece_8 = extrude(amount=25.902194282, mode=Mode.PRIVATE)
    fillet2_piece_8 = split(fillet2_piece_8, bisect_by=Plane(origin=(-39.506364614, 2, 28), z_dir=(0, 0, 1)), keep=Keep.TOP, mode=Mode.PRIVATE)
    add(fillet2_piece_8, mode=Mode.SUBTRACT)

    # Sketch6 → Cut-Extrude2 (cut)
    with BuildSketch(Plane(origin=(0, 4, 0), x_dir=(1, 0, 0), z_dir=(0, 1, 0)).offset(CUT_EXTRUDE2_START)):
        with Locations(Location((19, -24.5, 0), (0, 0, 270))):
            Circle(SKETCH6_R)
        with Locations(Location((19, 24.5, 0), (0, 0, 270))):
            Circle(SKETCH6_R)
    extrude(amount=CUT_EXTRUDE2_DEPTH, mode=Mode.SUBTRACT)

    # Sketch7 → Cut-Extrude3 (cut)
    with BuildSketch(Plane(origin=(0, 4, 0), x_dir=(1, 0, 0), z_dir=(0, 1, 0))):
        with Locations((24.748737342, -24.748737342)):
            Circle(SKETCH7_R)
        with Locations((24.748737342, 24.748737342)):
            Circle(SKETCH7_R)
    extrude(amount=CUT_EXTRUDE3_DEPTH, mode=Mode.SUBTRACT)


solid = part.part
